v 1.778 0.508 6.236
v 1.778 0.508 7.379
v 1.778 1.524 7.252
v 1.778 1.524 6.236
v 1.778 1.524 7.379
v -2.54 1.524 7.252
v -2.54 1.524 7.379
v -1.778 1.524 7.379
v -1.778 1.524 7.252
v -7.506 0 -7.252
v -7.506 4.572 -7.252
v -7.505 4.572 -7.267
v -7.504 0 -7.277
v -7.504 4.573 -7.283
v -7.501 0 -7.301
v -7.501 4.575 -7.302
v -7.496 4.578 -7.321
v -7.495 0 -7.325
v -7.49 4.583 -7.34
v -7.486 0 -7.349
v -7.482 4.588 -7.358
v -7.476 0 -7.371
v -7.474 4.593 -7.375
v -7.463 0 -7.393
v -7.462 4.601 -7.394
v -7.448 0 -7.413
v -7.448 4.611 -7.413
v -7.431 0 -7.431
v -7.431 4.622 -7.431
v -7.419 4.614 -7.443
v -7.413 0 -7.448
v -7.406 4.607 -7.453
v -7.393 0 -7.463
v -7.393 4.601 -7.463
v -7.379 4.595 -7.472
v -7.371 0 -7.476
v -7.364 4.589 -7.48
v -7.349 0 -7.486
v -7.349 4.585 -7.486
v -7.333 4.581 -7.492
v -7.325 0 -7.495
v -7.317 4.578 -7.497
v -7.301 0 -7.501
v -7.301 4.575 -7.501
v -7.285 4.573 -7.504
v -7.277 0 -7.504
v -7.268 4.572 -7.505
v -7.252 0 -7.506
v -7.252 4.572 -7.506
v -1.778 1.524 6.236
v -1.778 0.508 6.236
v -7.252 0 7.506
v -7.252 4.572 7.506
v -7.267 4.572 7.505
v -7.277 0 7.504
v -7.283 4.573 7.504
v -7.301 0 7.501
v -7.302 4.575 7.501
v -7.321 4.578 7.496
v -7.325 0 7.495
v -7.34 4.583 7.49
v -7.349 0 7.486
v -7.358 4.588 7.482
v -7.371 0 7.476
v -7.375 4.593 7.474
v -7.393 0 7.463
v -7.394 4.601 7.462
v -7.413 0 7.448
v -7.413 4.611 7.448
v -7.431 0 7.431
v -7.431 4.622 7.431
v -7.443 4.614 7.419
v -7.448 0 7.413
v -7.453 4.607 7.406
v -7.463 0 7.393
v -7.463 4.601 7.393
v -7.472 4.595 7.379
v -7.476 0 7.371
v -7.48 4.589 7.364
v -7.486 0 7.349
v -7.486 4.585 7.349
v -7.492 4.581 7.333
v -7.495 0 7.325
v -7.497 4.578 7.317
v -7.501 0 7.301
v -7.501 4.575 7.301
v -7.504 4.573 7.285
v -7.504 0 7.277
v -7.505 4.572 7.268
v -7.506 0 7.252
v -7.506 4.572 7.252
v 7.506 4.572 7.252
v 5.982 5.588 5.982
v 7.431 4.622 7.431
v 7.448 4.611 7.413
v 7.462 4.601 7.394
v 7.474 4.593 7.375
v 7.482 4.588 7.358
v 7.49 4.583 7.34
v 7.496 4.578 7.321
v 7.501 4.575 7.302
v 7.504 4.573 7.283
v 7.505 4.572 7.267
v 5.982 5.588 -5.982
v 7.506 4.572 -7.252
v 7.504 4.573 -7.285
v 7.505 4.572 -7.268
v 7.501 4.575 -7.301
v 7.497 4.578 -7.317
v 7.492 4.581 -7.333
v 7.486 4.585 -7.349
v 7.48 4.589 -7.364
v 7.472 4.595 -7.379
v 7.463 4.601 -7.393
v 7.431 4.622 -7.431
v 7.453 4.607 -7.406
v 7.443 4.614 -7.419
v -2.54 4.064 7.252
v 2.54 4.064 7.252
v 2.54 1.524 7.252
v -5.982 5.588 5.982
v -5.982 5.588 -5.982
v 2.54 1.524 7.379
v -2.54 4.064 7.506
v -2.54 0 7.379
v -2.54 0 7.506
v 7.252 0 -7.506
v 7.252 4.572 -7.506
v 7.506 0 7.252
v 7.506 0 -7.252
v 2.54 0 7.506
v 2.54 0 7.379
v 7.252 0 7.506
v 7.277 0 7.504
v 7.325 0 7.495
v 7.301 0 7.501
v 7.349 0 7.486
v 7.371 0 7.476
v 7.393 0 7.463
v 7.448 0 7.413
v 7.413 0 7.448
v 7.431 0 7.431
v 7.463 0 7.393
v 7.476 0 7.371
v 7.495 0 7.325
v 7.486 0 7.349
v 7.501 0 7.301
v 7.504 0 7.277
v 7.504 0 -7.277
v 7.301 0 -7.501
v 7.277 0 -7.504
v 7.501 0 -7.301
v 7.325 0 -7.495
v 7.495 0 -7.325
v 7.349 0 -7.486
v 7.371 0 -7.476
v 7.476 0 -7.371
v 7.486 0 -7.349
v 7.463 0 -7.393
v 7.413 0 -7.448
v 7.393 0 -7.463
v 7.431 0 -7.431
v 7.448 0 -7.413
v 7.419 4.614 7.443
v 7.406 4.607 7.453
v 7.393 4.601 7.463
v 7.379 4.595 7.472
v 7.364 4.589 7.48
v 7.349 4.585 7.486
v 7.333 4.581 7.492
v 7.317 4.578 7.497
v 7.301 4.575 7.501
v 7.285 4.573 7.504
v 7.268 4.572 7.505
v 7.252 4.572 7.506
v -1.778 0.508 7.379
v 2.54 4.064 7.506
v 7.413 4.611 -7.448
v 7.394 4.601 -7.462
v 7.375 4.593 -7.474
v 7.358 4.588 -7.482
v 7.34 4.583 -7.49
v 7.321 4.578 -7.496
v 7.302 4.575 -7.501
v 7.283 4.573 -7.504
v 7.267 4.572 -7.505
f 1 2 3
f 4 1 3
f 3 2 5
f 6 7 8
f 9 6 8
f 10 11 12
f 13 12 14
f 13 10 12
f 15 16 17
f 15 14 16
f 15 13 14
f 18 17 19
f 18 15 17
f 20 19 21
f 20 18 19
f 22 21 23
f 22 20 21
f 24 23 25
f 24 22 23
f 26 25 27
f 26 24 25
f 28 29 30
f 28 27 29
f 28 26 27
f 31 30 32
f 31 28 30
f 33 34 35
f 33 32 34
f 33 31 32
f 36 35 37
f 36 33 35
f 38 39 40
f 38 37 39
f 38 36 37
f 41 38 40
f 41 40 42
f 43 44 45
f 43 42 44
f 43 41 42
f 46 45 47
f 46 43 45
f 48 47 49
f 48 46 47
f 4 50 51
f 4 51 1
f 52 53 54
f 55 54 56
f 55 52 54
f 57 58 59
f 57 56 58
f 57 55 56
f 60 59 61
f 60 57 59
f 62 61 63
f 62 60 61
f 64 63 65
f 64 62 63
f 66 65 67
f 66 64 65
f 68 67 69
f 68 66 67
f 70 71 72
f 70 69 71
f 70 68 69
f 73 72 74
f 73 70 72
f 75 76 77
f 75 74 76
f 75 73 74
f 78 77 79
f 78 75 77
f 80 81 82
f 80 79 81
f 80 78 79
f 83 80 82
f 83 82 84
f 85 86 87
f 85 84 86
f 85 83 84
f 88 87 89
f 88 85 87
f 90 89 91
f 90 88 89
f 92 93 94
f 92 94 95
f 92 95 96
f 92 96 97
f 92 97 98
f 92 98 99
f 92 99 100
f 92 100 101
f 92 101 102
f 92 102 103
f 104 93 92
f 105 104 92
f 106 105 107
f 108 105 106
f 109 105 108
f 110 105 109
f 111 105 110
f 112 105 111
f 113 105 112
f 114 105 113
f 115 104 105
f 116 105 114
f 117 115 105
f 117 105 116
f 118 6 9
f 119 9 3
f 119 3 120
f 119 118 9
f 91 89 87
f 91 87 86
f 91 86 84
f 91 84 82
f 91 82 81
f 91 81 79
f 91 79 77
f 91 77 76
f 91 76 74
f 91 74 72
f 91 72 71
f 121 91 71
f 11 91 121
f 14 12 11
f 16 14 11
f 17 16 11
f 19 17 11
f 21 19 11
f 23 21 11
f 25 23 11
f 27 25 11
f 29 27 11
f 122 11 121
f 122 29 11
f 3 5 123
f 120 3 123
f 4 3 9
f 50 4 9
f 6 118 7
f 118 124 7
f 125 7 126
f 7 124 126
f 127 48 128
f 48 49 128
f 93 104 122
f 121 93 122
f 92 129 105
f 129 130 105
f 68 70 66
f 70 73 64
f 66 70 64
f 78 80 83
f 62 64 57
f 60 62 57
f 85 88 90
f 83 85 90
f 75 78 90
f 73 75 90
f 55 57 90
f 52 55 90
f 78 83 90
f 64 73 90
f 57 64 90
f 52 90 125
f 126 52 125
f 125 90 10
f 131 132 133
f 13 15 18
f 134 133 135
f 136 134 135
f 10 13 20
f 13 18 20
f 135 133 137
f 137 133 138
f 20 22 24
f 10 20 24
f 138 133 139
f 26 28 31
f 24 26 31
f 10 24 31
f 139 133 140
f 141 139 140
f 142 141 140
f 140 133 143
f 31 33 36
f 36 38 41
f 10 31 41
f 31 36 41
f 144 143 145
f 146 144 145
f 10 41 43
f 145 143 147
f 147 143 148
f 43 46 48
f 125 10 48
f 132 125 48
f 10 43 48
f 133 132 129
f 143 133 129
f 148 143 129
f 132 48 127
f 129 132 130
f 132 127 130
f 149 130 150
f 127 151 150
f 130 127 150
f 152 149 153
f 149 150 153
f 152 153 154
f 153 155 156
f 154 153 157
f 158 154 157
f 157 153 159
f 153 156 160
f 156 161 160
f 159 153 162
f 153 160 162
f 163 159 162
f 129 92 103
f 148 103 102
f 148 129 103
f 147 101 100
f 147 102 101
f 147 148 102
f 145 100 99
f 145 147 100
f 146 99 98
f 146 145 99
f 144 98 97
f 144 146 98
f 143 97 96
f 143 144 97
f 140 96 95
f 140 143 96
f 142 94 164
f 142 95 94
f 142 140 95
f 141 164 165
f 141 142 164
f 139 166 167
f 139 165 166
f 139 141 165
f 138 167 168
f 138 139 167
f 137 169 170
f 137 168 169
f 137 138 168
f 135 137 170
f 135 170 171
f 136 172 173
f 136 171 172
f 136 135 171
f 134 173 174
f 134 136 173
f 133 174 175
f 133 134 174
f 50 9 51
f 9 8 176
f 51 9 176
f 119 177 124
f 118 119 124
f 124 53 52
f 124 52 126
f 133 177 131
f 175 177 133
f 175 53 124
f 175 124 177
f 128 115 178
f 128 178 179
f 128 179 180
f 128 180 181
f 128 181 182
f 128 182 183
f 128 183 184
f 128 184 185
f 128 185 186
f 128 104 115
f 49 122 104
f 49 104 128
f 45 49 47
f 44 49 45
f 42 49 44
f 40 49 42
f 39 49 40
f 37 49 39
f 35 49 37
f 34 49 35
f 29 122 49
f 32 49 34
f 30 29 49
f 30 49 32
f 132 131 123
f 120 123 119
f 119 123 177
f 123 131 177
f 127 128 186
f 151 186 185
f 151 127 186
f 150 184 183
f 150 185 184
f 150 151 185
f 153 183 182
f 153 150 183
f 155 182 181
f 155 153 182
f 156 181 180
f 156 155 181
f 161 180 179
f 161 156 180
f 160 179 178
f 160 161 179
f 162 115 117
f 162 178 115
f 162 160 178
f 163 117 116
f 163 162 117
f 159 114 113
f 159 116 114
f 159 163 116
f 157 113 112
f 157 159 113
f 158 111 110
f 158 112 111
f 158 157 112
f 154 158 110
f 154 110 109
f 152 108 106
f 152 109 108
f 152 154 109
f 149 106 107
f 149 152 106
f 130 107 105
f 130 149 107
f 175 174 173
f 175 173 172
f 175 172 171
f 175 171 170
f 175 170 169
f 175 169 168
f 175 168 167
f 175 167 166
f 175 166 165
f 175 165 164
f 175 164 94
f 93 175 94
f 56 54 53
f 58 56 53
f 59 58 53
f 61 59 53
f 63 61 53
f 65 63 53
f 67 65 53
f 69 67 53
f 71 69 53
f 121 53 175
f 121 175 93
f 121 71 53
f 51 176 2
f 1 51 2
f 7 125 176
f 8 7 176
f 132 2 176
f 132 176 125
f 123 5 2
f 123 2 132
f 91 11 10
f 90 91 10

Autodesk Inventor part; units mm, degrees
sketch "Sketch_13" plane through (0, 0, 0) normal (0, 0, 1) x (1, 0, 0)
  line L0 (-7.5057, 0) -> (7.5057, 0)
  line L1 (7.5057, 0) -> (7.5057, 5.588)
  line L2 (7.5057, 5.588) -> (-7.5057, 5.588)
  line L3 (-7.5057, 5.588) -> (-7.5057, 0)
extrude "Extrusion1" add sketch "Sketch_13" along normal mid plane 15.0114
sketch "Sketch_21" plane through (0, 0, 0) normal (0, 1, 0) x (-1, 0, 0)
  line L0 (8.89, 8.89) -> (-8.89, 8.89)
  line L1 (-8.89, 8.89) -> (-8.89, -8.89)
  line L2 (-8.89, -8.89) -> (8.89, -8.89)
  line L3 (8.89, -8.89) -> (8.89, 8.89)
  line L4 (7.5057, -7.2517) -> (7.5057, 7.2517)
  arc A0 (7.5057, 7.2517) -> (7.2517, 7.5057) centre (7.2517, 7.2517) ccw
  line L5 (7.2517, 7.5057) -> (-7.2517, 7.5057)
  arc A1 (-7.2517, 7.5057) -> (-7.5057, 7.2517) centre (-7.2517, 7.2517) ccw
  line L6 (-7.5057, 7.2517) -> (-7.5057, -7.2517)
  arc A2 (-7.5057, -7.2517) -> (-7.2517, -7.5057) centre (-7.2517, -7.2517) ccw
  line L7 (-7.2517, -7.5057) -> (7.2517, -7.5057)
  arc A3 (7.2517, -7.5057) -> (7.5057, -7.2517) centre (7.2517, -7.2517) ccw
extrude "Extrusion2" cut sketch "Sketch_21" along normal blind 7.62
sketch "Sketch_14" plane through (0, 0, 0) normal (0, 0, 1) x (1, 0, 0)
  line L0 (-7.5057, 8.128) -> (-7.5057, 4.572)
  line L1 (-7.5057, 4.572) -> (-3.6957, 7.112)
  line L2 (-3.6957, 7.112) -> (3.6957, 7.112)
  line L3 (3.6957, 7.112) -> (7.5057, 4.572)
  line L4 (7.5057, 4.572) -> (7.5057, 8.128)
  line L5 (7.5057, 8.128) -> (-7.5057, 8.128)
extrude "Extrusion3" cut sketch "Sketch_14" along normal mid plane 15.24
sketch "Sketch_15" plane through (0, 0, 0) normal (1, 0, 0) x (0, 1, 0)
  line L0 (8.128, 7.5057) -> (4.572, 7.5057)
  line L1 (4.572, 7.5057) -> (7.112, 3.6957)
  line L2 (7.112, 3.6957) -> (7.112, -3.6957)
  line L3 (7.112, -3.6957) -> (4.572, -7.5057)
  line L4 (4.572, -7.5057) -> (8.128, -7.5057)
  line L5 (8.128, -7.5057) -> (8.128, 7.5057)
extrude "Extrusion4" cut sketch "Sketch_15" along normal mid plane 15.24
sketch "Sketch_17" plane through (0, 0, 7.5057) normal (0, 0, 1) x (1, 0, 0)
  line L0 (-2.54, 0) -> (2.54, 0)
  line L1 (2.54, 0) -> (2.54, 4.064)
  line L2 (2.54, 4.064) -> (-2.54, 4.064)
  line L3 (-2.54, 4.064) -> (-2.54, 0)
extrude "Extrusion5" cut sketch "Sketch_17" against normal blind 0.127
sketch "Sketch_18" plane through (0, 0, 7.5057) normal (0, 0, 1) x (1, 0, 0)
  line L0 (-2.54, 1.524) -> (2.54, 1.524)
  line L1 (2.54, 1.524) -> (2.54, 4.064)
  line L2 (2.54, 4.064) -> (-2.54, 4.064)
  line L3 (-2.54, 4.064) -> (-2.54, 1.524)
extrude "Extrusion6" cut sketch "Sketch_18" against normal blind 0.254
sketch "Sketch_19" plane through (0, 0, 7.5057) normal (0, 0, 1) x (1, 0, 0)
  line L0 (-1.778, 0.508) -> (1.778, 0.508)
  line L1 (1.778, 0.508) -> (1.778, 1.524)
  line L2 (1.778, 1.524) -> (-1.778, 1.524)
  line L3 (-1.778, 1.524) -> (-1.778, 0.508)
extrude "Extrusion7" cut sketch "Sketch_19" against normal blind 1.27
ref_plane "lens_to_body_XY" through (0, 0, 0) normal (0, 1, 0) x (1, 0, 0)
ref_plane "lens_to_body_YZ" through (0, 0, 0) normal (1, 0, 0) x (0, 0, -1)
ref_plane "lens_to_body_ZX" through (0, 0, 0) normal (0, 0, -1) x (0, 1, 0)
properties part number "UB216KKW015C-NR"
